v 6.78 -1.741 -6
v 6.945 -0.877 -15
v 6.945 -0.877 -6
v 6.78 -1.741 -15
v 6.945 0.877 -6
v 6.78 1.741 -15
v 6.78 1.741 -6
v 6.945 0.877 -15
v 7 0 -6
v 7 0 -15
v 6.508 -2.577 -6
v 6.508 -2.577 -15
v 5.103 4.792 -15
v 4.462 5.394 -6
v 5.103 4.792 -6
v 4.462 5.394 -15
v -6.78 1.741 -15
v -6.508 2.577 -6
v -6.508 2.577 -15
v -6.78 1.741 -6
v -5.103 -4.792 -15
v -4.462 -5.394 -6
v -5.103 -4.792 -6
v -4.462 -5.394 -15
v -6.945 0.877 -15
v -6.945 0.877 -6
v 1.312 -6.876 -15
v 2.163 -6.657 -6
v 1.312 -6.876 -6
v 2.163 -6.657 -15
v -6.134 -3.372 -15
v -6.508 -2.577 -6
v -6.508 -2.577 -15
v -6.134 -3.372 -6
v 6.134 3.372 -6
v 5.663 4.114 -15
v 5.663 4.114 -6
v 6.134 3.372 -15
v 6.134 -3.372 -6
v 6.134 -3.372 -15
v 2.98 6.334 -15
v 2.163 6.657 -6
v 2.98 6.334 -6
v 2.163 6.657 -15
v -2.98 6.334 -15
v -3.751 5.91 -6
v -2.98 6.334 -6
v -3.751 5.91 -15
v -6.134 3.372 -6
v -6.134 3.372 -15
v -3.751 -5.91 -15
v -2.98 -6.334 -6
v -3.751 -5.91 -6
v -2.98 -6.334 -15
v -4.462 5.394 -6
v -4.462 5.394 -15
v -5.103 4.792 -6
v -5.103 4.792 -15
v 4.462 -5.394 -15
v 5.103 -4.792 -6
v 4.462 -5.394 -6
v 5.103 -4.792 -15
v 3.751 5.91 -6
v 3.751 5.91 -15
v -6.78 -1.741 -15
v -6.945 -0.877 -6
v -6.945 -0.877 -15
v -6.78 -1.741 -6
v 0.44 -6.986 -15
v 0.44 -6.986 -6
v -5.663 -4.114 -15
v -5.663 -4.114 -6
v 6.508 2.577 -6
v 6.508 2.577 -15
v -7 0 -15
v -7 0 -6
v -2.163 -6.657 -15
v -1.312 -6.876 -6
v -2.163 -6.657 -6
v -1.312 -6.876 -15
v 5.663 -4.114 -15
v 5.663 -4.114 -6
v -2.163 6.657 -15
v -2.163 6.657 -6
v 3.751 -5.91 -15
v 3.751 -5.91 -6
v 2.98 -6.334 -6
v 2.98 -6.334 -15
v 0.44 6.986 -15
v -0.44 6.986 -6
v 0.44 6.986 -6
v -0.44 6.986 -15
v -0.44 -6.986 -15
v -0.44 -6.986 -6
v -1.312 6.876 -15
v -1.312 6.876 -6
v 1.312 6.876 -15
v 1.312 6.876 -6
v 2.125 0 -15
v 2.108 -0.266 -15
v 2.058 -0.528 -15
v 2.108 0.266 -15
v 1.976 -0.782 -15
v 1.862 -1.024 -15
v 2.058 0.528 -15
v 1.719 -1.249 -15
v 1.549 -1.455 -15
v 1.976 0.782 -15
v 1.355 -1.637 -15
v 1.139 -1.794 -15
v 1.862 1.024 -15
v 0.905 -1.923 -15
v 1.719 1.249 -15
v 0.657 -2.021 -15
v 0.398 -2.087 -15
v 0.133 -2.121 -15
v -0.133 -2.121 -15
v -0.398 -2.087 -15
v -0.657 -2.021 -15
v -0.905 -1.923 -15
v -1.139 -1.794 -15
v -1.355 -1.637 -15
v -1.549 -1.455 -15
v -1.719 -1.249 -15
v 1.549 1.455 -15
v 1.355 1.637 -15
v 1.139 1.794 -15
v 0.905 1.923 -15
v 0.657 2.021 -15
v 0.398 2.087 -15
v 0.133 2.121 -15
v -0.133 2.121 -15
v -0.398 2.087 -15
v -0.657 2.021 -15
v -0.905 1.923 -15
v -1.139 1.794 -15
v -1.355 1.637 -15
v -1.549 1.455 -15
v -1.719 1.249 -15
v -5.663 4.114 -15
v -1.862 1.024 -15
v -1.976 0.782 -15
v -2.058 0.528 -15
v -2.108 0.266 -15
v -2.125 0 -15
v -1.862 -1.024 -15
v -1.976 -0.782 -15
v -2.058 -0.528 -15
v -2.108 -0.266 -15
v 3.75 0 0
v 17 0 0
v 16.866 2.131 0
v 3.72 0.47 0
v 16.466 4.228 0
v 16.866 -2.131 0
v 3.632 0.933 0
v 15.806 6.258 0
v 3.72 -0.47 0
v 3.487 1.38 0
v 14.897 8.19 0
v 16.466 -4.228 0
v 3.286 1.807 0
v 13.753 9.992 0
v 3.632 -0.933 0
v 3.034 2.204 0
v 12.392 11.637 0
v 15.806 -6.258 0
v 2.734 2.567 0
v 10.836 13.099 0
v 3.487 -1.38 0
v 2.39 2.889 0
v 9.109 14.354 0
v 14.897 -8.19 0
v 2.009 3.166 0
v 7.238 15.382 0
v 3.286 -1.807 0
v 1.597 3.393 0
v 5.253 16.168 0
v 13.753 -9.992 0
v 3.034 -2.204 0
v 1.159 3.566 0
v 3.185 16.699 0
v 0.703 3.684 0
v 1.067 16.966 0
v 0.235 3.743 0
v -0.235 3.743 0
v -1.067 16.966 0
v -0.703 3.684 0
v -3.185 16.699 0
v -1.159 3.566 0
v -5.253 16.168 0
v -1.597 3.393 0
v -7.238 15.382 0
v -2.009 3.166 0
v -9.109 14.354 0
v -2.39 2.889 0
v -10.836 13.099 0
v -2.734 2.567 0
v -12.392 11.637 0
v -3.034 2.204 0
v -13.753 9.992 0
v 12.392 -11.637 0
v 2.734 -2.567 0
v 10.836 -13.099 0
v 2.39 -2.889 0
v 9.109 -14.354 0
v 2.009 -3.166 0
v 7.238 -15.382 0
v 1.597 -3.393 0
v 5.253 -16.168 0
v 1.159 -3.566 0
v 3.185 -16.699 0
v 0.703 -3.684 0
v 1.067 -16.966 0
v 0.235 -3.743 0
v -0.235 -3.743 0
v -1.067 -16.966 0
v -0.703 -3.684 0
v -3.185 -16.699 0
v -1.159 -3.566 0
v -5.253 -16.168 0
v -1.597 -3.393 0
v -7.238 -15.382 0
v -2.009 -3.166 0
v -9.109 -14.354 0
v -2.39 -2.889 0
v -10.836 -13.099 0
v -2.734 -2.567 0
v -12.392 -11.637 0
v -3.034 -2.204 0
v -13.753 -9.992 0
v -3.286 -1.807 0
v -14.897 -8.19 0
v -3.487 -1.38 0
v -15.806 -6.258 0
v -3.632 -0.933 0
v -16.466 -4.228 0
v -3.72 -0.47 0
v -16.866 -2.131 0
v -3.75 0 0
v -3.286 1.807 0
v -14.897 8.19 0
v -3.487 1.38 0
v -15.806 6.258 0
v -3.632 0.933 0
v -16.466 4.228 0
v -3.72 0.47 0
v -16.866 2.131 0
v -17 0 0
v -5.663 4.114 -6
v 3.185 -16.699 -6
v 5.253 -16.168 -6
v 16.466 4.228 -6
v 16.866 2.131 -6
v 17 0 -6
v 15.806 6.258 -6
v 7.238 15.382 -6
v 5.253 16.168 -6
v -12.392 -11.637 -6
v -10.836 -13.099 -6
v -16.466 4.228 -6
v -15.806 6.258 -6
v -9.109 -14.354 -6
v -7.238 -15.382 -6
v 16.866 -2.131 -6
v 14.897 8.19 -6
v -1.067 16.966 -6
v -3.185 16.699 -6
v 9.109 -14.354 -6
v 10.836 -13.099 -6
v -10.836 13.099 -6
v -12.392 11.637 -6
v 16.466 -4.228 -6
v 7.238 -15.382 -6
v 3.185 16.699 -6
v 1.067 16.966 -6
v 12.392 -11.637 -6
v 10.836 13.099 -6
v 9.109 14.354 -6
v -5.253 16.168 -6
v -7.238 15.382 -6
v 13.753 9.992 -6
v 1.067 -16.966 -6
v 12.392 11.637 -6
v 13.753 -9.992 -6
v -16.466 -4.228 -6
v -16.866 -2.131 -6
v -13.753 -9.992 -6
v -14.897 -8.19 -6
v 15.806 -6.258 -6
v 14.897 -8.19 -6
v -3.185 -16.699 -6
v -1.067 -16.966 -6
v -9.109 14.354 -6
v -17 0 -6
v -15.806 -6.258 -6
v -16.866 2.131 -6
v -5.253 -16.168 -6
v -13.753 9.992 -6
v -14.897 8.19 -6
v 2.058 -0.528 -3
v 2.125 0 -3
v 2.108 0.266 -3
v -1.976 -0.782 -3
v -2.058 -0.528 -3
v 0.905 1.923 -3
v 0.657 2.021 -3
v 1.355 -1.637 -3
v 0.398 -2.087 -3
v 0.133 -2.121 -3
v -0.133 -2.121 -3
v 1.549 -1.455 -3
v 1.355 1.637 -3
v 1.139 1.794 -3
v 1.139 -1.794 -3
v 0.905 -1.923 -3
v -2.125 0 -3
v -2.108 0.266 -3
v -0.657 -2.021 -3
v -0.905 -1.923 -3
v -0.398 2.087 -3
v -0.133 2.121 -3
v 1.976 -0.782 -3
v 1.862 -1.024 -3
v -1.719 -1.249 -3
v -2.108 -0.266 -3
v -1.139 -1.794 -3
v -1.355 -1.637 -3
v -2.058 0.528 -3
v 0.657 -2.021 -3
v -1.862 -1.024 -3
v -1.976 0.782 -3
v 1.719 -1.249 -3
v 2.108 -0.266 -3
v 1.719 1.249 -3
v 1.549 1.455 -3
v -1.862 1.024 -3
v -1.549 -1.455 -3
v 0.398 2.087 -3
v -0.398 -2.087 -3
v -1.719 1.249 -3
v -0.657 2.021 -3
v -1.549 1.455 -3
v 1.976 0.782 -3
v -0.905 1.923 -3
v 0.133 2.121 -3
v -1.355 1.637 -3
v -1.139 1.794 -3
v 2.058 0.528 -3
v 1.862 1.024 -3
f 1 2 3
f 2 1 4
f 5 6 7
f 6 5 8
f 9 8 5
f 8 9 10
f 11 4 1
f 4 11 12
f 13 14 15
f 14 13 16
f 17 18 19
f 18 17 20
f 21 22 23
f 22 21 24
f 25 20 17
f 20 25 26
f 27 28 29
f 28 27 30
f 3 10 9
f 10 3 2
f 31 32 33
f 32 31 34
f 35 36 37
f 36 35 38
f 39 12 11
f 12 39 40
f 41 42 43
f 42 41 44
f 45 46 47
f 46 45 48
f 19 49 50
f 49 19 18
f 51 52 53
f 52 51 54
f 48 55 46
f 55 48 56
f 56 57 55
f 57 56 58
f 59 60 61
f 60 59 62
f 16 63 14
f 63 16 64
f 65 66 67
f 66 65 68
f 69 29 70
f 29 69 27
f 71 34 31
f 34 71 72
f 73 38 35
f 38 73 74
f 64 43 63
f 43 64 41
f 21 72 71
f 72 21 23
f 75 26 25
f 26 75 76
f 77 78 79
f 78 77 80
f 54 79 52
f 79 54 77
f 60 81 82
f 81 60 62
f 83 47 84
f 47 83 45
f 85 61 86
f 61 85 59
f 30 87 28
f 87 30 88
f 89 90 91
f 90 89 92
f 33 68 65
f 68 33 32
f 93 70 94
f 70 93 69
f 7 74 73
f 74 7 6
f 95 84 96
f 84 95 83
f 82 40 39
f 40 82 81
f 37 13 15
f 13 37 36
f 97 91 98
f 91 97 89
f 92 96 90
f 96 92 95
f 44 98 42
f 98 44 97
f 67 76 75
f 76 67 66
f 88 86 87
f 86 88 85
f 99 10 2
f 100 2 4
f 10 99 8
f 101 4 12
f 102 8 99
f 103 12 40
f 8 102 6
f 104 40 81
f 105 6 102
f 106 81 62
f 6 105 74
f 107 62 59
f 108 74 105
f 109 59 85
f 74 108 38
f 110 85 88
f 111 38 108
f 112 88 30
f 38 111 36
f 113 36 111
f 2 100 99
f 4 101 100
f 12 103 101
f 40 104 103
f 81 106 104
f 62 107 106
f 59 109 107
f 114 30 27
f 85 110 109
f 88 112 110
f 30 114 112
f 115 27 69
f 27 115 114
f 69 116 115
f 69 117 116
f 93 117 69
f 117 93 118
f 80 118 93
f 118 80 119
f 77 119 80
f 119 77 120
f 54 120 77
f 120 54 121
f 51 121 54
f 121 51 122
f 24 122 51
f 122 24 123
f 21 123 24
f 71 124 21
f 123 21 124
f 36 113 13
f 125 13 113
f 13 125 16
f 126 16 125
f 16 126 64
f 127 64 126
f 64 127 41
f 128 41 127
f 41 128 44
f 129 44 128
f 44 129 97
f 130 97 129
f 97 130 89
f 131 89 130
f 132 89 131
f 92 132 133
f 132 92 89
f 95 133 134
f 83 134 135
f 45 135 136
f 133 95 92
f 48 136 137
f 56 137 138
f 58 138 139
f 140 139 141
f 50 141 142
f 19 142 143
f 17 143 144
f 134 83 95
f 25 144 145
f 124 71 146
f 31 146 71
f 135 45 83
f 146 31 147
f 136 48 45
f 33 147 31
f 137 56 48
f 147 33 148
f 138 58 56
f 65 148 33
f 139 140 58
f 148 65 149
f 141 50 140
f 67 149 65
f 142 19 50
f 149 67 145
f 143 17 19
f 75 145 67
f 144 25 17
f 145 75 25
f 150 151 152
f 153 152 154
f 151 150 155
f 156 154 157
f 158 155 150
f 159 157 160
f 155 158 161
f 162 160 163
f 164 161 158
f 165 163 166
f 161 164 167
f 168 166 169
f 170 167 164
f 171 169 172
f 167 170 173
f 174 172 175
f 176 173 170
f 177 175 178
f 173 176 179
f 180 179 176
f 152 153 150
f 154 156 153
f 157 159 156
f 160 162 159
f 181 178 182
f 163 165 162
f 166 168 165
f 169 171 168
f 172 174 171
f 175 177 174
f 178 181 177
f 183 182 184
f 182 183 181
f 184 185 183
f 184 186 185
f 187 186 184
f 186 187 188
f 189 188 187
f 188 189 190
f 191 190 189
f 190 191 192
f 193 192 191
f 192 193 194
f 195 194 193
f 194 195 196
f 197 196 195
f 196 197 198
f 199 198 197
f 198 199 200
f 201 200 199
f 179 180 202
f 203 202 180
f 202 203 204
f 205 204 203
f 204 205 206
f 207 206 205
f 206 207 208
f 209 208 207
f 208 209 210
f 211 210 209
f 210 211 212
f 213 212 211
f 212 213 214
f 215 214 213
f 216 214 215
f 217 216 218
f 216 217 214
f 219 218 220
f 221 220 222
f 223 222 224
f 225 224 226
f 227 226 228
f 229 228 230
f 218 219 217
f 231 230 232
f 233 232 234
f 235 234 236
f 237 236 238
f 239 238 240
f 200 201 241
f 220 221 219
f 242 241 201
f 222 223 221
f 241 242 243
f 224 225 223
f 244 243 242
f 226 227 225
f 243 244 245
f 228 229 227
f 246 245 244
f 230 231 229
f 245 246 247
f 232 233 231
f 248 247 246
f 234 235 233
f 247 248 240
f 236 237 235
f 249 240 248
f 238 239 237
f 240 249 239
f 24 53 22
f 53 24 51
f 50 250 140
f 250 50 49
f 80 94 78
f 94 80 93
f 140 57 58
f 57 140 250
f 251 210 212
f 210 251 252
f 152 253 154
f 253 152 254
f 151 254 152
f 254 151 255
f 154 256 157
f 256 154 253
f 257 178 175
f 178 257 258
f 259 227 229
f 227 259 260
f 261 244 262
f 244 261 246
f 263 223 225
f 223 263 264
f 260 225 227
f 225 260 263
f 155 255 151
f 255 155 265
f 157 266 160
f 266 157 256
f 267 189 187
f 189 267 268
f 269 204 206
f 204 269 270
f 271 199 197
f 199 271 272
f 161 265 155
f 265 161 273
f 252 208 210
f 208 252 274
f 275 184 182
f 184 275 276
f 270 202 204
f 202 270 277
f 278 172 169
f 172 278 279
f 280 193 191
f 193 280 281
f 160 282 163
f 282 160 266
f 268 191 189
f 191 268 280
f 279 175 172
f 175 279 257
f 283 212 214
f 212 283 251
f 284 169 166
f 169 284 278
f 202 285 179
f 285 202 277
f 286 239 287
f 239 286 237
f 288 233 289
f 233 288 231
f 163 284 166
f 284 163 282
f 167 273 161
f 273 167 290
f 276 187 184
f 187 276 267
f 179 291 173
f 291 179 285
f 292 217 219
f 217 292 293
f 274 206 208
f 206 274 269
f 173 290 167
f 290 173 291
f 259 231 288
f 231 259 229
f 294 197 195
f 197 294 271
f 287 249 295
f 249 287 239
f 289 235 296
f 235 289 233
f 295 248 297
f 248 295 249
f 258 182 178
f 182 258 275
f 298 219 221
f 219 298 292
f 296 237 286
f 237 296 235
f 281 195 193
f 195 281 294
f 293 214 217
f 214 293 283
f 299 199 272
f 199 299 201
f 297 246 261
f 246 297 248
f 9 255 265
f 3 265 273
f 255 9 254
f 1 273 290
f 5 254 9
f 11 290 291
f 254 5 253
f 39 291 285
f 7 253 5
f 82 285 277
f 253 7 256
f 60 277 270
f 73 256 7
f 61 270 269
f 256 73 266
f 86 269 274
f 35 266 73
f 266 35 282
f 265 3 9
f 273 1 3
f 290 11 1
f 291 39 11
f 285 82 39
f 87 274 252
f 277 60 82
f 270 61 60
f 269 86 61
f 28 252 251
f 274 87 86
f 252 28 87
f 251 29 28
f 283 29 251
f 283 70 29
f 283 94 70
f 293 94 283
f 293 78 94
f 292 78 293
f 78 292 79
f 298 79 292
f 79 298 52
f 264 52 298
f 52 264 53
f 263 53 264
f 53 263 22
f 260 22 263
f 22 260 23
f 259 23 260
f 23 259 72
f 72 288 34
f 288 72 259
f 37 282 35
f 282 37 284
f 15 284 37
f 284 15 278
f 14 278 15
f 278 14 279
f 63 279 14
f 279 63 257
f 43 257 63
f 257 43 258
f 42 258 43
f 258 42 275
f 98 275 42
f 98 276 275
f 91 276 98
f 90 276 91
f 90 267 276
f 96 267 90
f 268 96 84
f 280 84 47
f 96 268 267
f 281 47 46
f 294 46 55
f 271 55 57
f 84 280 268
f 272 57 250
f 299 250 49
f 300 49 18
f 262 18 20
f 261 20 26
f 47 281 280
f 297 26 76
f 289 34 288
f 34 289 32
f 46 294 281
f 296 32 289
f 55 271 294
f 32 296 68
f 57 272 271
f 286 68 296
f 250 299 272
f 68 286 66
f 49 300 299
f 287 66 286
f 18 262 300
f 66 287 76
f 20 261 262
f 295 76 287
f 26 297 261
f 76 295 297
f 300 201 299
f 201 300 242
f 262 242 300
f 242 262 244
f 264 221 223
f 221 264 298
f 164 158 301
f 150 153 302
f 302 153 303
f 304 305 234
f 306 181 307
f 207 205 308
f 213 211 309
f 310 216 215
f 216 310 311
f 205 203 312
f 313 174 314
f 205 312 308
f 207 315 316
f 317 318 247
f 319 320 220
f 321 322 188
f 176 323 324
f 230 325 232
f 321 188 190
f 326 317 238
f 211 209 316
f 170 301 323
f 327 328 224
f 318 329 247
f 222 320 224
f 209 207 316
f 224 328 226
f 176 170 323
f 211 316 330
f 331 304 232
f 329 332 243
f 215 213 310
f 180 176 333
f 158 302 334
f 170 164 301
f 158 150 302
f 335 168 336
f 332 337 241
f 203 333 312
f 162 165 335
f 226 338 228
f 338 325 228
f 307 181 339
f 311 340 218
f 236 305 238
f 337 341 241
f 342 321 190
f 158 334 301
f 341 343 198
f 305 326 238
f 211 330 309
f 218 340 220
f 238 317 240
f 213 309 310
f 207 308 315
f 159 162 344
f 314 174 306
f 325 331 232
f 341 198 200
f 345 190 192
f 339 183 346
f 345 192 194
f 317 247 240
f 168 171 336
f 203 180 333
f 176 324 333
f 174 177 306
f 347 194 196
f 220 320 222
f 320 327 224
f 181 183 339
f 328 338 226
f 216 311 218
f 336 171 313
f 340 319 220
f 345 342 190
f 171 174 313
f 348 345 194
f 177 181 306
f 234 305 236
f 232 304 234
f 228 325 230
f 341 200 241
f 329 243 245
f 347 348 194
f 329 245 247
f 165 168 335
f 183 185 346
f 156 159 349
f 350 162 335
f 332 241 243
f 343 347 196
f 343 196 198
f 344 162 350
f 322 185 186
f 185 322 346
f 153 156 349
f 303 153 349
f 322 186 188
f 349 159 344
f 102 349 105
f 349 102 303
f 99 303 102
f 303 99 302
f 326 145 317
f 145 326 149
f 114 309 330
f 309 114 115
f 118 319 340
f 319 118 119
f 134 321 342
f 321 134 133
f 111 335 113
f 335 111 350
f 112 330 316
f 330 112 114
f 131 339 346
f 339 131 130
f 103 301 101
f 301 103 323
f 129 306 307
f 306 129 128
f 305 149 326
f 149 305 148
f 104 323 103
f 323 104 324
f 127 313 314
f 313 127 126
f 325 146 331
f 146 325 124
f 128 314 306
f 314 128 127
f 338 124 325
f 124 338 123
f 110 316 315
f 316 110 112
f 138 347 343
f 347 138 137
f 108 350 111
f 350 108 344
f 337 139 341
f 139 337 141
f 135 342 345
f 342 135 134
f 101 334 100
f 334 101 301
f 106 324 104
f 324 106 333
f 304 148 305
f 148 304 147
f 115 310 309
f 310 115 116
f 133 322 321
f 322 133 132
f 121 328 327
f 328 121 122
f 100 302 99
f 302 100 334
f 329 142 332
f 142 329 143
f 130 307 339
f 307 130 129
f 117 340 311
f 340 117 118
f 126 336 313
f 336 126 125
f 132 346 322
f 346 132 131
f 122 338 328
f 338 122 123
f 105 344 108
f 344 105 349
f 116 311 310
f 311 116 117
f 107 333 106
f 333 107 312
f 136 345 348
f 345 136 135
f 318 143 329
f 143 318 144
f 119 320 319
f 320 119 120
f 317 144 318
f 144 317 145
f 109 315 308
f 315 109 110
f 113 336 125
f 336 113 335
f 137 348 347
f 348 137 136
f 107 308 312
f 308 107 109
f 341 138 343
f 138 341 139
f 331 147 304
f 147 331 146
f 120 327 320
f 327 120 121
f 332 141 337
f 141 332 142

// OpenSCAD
$fn = 50;


difference() {
	union() {
		translate(v = [0, 0, -15.0000000000]) {
			cylinder(h = 15, r = 7.0000000000);
		}
		translate(v = [0, 0, -6.0000000000]) {
			cylinder(h = 6, r = 17.0000000000);
		}
	}
	union() {
		translate(v = [0, 0, 0]) {
			rotate(a = [0, 0, 0]) {
				difference() {
					union() {
						#translate(v = [0, 0, -15.0000000000]) {
							cylinder(h = 15, r = 2.0000000000);
						}
						#translate(v = [0, 0, -3]) {
							cylinder(h = 3, r1 = 2.1250000000, r2 = 3.7500000000);
						}
						#translate(v = [0, 0, -15.0000000000]) {
							cylinder(h = 15, r = 2.1250000000);
						}
						#translate(v = [0, 0, -15.0000000000]) {
							cylinder(h = 15, r = 2.0000000000);
						}
					}
					union();
				}
			}
		}
	}
}
